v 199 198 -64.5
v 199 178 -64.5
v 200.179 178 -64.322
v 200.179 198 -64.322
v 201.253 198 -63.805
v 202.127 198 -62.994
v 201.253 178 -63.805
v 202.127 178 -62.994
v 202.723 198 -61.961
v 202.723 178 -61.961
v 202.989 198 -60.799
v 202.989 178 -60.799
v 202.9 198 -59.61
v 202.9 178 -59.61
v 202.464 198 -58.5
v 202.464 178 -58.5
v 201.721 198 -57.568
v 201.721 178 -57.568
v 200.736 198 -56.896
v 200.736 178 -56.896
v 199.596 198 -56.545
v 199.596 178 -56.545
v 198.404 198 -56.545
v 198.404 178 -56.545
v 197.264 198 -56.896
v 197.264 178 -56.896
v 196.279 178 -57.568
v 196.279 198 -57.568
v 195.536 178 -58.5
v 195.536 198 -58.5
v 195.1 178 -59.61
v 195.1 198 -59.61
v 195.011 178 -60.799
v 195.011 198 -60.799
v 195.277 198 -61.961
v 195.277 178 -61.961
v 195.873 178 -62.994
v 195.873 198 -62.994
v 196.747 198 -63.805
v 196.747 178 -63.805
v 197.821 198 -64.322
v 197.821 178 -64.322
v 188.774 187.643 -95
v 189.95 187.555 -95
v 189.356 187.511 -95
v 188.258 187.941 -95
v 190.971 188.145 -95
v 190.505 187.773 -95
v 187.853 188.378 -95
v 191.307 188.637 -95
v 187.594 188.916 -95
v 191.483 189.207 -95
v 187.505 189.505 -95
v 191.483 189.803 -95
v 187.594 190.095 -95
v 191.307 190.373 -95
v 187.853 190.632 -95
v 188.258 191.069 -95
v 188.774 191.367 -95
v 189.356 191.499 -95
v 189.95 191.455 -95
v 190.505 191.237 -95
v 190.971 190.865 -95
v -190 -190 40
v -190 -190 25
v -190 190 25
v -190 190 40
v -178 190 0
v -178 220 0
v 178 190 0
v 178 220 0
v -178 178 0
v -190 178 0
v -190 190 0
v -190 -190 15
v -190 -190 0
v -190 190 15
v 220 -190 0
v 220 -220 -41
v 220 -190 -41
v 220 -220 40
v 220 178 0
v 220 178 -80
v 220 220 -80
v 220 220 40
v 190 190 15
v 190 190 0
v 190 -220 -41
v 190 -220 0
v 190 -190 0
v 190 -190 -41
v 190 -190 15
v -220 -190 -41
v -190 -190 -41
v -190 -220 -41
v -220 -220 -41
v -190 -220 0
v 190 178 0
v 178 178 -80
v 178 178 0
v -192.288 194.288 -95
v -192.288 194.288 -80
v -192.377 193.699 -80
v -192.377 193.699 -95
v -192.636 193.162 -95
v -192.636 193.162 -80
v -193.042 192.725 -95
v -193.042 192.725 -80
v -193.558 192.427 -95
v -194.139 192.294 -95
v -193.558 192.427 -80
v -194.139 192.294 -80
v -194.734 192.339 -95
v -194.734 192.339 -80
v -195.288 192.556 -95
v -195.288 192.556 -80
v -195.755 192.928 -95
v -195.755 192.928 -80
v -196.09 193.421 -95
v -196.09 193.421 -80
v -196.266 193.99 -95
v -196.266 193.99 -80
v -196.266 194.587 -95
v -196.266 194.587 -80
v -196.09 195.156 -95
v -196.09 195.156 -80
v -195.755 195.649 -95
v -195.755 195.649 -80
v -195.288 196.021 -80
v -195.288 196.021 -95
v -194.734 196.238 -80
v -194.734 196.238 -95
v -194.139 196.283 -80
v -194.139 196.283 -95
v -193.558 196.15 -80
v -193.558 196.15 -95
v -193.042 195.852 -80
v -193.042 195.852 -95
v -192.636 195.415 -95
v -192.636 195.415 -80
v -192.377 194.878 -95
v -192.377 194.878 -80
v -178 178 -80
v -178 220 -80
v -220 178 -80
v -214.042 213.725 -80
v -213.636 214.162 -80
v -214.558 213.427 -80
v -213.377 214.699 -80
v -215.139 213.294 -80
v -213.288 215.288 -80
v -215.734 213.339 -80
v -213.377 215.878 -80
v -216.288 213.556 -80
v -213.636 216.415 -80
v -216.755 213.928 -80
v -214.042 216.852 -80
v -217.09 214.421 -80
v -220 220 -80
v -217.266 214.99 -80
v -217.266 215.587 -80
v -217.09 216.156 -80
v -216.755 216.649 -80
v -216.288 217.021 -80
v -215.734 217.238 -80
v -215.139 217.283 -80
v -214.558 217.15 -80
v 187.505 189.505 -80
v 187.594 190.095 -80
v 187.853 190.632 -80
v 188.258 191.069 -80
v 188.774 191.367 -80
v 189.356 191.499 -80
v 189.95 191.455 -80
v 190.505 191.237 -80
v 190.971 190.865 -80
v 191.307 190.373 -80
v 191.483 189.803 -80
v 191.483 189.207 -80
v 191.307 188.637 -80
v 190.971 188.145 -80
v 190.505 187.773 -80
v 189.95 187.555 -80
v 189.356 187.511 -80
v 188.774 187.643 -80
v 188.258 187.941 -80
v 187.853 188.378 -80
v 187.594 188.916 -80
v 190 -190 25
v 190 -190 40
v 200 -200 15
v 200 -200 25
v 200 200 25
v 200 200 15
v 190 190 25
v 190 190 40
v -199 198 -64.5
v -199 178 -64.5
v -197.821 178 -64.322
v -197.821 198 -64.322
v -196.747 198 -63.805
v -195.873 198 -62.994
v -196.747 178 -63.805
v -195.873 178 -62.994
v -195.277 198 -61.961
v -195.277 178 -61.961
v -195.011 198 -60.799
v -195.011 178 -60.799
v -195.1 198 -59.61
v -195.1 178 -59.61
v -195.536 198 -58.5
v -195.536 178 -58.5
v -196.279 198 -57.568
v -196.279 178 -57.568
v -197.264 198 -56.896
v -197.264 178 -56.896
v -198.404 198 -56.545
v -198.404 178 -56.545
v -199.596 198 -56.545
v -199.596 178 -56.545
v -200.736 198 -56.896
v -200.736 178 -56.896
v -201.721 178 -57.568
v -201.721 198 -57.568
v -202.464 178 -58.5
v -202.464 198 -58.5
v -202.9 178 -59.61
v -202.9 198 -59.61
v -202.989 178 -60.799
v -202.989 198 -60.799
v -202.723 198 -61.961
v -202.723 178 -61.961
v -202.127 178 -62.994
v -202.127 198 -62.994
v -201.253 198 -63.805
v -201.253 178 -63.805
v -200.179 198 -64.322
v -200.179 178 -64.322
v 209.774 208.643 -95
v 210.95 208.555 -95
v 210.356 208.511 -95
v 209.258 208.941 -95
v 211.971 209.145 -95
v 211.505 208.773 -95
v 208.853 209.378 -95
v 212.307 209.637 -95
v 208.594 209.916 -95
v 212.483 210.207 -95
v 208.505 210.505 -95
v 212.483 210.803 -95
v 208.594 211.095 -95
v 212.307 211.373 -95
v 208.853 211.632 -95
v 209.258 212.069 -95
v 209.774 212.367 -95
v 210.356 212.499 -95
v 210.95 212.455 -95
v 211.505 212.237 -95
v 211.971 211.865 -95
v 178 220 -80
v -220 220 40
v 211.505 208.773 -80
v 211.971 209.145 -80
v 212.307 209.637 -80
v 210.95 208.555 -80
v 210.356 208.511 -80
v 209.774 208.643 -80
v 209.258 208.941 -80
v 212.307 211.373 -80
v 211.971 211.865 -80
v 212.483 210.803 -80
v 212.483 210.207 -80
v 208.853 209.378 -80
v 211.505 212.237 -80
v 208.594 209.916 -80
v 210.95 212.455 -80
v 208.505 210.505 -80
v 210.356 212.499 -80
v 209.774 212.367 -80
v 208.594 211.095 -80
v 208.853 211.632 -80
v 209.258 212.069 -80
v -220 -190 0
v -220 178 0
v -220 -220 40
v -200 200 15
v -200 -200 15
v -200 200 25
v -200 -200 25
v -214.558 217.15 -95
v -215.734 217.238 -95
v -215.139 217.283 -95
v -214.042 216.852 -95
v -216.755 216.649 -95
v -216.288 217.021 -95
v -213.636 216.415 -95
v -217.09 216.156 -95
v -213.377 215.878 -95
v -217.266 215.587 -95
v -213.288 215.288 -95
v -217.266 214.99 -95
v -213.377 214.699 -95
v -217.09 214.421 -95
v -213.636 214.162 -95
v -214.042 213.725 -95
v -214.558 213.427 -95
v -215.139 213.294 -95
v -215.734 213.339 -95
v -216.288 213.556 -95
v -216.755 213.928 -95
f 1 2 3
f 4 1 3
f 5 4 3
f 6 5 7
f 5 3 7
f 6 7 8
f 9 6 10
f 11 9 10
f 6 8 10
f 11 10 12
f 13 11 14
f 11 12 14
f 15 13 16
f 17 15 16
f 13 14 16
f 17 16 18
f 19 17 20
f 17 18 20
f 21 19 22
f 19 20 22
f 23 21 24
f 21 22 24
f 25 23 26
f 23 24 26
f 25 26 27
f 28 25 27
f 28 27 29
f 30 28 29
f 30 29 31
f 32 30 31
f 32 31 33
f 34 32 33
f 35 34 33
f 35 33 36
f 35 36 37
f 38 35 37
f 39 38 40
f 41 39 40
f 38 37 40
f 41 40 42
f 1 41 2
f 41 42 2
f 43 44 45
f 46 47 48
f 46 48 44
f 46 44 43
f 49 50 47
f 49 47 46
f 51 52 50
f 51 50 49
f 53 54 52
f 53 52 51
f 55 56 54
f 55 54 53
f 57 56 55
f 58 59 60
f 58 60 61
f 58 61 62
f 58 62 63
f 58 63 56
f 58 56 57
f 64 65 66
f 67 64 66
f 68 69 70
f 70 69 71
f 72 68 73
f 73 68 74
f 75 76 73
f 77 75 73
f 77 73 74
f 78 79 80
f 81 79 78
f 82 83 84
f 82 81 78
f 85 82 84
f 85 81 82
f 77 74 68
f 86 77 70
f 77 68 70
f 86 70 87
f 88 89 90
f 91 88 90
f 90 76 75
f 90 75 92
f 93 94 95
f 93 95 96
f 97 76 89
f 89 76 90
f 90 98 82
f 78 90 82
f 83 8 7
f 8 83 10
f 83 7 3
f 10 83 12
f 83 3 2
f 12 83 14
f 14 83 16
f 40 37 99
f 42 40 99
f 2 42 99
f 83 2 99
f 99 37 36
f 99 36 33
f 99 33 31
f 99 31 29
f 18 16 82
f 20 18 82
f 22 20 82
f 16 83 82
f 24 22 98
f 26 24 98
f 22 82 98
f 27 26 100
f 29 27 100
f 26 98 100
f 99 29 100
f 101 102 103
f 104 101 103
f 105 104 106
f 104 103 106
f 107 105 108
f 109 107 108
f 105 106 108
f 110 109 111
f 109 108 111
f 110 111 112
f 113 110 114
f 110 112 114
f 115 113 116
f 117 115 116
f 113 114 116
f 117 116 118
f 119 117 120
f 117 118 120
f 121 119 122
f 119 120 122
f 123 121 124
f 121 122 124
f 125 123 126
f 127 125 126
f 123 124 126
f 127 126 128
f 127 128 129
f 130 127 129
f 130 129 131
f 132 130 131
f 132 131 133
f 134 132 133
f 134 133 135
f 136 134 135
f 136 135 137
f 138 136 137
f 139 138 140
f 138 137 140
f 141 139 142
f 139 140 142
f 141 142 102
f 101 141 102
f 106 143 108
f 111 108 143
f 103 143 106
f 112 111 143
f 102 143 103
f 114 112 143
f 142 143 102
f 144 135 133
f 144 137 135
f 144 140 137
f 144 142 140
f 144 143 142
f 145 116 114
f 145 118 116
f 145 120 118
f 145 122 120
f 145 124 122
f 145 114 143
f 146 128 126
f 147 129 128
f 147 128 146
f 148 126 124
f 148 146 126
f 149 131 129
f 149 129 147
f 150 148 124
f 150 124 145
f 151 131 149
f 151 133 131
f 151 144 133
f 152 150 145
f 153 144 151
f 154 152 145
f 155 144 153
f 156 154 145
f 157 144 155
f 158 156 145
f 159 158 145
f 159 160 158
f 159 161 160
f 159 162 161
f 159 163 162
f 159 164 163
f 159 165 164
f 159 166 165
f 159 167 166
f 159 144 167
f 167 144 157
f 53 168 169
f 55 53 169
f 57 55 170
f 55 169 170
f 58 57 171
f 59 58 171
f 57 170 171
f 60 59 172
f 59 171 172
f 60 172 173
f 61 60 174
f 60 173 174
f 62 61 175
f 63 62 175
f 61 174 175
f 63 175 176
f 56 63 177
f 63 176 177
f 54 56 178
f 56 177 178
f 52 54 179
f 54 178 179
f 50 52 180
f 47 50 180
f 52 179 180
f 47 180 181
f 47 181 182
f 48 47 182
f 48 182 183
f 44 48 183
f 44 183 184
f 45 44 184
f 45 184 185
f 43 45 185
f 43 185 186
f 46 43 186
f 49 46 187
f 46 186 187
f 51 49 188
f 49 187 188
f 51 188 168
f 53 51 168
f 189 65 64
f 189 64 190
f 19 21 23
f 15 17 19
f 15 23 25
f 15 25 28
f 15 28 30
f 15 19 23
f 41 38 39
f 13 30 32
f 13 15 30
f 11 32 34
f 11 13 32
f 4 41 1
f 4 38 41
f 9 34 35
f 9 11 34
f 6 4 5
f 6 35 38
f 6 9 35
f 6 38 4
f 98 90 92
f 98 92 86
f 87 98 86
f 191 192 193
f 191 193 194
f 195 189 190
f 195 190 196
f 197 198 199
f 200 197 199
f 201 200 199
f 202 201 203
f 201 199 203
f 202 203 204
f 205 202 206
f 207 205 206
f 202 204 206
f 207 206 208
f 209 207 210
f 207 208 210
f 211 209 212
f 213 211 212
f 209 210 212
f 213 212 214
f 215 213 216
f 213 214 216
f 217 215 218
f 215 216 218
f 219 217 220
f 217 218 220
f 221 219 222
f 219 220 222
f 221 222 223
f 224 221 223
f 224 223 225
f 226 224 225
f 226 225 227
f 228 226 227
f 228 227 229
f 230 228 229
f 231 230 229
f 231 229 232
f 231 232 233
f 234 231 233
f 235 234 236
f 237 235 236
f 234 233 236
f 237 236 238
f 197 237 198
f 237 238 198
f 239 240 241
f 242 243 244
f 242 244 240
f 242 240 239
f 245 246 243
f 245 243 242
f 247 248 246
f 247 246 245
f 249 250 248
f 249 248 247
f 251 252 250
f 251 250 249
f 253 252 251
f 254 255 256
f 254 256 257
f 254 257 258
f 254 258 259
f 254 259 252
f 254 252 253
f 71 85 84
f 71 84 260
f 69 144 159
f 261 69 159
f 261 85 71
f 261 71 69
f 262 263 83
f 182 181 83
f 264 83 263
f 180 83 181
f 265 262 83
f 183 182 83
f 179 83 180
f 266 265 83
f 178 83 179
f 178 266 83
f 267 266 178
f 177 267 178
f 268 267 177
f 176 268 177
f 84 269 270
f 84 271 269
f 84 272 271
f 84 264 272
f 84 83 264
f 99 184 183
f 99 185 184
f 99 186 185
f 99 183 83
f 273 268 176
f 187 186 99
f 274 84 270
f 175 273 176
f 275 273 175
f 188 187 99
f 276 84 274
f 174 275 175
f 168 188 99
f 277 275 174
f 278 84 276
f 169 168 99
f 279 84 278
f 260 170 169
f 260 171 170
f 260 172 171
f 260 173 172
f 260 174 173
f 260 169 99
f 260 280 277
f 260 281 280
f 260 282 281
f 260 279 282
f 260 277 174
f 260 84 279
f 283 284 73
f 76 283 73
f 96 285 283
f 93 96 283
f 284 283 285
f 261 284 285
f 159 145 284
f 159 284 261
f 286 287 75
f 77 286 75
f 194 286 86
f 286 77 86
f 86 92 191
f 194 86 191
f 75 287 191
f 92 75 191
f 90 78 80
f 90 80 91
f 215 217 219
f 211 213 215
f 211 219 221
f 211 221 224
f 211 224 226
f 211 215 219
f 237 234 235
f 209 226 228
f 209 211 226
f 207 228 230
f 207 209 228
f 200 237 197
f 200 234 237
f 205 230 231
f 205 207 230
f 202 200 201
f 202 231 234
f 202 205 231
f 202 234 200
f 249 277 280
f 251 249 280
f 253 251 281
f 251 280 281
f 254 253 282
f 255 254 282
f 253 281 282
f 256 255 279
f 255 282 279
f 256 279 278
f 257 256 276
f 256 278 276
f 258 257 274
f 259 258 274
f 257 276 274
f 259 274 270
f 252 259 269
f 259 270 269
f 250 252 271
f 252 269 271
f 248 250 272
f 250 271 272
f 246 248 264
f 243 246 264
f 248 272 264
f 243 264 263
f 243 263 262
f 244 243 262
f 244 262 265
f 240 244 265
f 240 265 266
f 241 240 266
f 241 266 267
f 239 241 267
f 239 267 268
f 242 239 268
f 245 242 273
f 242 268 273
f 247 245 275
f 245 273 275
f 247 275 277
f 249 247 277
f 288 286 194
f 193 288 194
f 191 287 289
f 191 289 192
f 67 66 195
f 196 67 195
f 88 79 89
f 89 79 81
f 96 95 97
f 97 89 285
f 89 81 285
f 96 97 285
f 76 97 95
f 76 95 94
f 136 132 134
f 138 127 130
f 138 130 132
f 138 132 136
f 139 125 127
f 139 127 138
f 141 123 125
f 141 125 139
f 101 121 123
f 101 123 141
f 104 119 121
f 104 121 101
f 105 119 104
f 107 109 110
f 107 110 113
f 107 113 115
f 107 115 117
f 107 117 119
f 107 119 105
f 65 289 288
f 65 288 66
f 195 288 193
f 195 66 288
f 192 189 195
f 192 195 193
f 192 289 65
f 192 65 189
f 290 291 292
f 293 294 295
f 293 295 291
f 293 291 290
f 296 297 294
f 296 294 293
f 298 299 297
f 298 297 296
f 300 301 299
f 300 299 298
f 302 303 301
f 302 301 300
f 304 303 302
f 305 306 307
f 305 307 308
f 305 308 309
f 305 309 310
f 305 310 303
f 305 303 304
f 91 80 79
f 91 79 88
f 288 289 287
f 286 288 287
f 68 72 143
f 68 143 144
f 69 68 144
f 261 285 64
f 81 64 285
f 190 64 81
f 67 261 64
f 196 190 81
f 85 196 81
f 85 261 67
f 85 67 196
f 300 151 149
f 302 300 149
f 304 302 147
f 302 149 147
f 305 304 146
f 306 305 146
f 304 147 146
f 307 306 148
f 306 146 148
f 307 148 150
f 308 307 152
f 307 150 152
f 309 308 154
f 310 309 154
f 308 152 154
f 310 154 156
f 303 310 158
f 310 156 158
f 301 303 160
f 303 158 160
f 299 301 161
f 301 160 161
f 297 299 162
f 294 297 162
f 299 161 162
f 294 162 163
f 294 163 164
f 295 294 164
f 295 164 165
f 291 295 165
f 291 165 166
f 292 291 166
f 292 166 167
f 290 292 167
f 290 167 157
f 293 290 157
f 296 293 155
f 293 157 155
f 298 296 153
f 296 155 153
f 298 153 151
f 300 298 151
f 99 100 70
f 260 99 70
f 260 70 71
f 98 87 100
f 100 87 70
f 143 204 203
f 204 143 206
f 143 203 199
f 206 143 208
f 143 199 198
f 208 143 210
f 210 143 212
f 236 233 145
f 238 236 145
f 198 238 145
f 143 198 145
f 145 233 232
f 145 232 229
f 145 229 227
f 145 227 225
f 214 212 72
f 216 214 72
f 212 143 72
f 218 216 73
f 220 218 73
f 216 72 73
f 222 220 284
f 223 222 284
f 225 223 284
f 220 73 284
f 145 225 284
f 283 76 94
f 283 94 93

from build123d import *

# Parameters (mm, degrees)
ESQUISSE1_W                  = 440
ESQUISSE1_H                  = 440
ESQUISSE1_W_2                = 380
ESQUISSE1_H_2                = 380
BOSS_EXTRU_1_DEPTH           = 40
ENL_V_MAT_EXTRU_1_DEPTH      = 390
ENL_V_MAT_EXTRU_1_DEPTH_BACK = 10
ESQUISSE2_W                  = 400
ESQUISSE2_H                  = 10
ESQUISSE3_W                  = 42
ESQUISSE3_H                  = 42
BOSS_EXTRU_2_DEPTH           = 80
ESQUISSE5_R                  = 2
BOSS_EXTRU_3_DEPTH           = 15
ESQUISSE7_R                  = 4
ENL_V_MAT_EXTRU_2_DEPTH      = 20
ESQUISSE8_W                  = 30
ESQUISSE8_H                  = 30
BOSS_EXTRU_4_DEPTH           = 41


with BuildPart() as part:
    # Esquisse1 → Boss.-Extru.1 (new body)
    with BuildSketch(Plane.XY):
        Rectangle(ESQUISSE1_W, ESQUISSE1_H)
        Rectangle(ESQUISSE1_W_2, ESQUISSE1_H_2, mode=Mode.SUBTRACT)
    extrude(amount=BOSS_EXTRU_1_DEPTH)

    # Esquisse2 → Enlèv. mat.-Extru.1 (cut, two sides: drawn at the far end of the back side and taken through both)
    with BuildSketch(Plane(origin=(0, -190, 0), x_dir=(1, 0, 0), z_dir=(0, 1, 0)).offset(-ENL_V_MAT_EXTRU_1_DEPTH_BACK)):
        with Locations((0, -20)):
            Rectangle(ESQUISSE2_W, ESQUISSE2_H)
    extrude(amount=ENL_V_MAT_EXTRU_1_DEPTH + ENL_V_MAT_EXTRU_1_DEPTH_BACK, mode=Mode.SUBTRACT)

    # Esquisse3 → Boss.-Extru.2 (add)
    with BuildSketch(Plane(origin=(0, 0, 0), x_dir=(-1, 0, 0), z_dir=(0, 0, -1))):
        with Locations((-199, 199)):
            Rectangle(ESQUISSE3_W, ESQUISSE3_H)
        with Locations((199, 199)):
            Rectangle(ESQUISSE3_W, ESQUISSE3_H)
    extrude(amount=BOSS_EXTRU_2_DEPTH)

    # Esquisse5 → Boss.-Extru.3 (add)
    with BuildSketch(Plane(origin=(0, 0, -80), x_dir=(-1, 0, 0), z_dir=(0, 0, -1))):
        with Locations((-210.505010618, 210.505010618)):
            Circle(ESQUISSE5_R)
        with Locations((-189.505010618, 189.505010618)):
            Circle(ESQUISSE5_R)
        with Locations(Location((215.288490097, 215.288490097, 0), (0, 0, 180))):
            Circle(ESQUISSE5_R)
        with Locations(Location((194.288490097, 194.288490097, 0), (0, 0, 180))):
            Circle(ESQUISSE5_R)
    extrude(amount=BOSS_EXTRU_3_DEPTH)

    # Esquisse7 → Enlèv. mat.-Extru.2 (cut)
    with BuildSketch(Plane.XZ.offset(-178)):
        with Locations(Location((199, -60.5, 0), (0, 0, 270))):
            Circle(ESQUISSE7_R)
        with Locations(Location((-199, -60.5, 0), (0, 0, 270))):
            Circle(ESQUISSE7_R)
    extrude(amount=-ENL_V_MAT_EXTRU_2_DEPTH, mode=Mode.SUBTRACT)

    # Esquisse8 → Boss.-Extru.4 (add)
    with BuildSketch(Plane(origin=(0, 0, 0), x_dir=(-1, 0, 0), z_dir=(0, 0, -1))):
        with Locations((-205, -205)):
            Rectangle(ESQUISSE8_W, ESQUISSE8_H)
        with Locations((205, -205)):
            Rectangle(ESQUISSE8_W, ESQUISSE8_H)
    extrude(amount=BOSS_EXTRU_4_DEPTH)


solid = part.part
